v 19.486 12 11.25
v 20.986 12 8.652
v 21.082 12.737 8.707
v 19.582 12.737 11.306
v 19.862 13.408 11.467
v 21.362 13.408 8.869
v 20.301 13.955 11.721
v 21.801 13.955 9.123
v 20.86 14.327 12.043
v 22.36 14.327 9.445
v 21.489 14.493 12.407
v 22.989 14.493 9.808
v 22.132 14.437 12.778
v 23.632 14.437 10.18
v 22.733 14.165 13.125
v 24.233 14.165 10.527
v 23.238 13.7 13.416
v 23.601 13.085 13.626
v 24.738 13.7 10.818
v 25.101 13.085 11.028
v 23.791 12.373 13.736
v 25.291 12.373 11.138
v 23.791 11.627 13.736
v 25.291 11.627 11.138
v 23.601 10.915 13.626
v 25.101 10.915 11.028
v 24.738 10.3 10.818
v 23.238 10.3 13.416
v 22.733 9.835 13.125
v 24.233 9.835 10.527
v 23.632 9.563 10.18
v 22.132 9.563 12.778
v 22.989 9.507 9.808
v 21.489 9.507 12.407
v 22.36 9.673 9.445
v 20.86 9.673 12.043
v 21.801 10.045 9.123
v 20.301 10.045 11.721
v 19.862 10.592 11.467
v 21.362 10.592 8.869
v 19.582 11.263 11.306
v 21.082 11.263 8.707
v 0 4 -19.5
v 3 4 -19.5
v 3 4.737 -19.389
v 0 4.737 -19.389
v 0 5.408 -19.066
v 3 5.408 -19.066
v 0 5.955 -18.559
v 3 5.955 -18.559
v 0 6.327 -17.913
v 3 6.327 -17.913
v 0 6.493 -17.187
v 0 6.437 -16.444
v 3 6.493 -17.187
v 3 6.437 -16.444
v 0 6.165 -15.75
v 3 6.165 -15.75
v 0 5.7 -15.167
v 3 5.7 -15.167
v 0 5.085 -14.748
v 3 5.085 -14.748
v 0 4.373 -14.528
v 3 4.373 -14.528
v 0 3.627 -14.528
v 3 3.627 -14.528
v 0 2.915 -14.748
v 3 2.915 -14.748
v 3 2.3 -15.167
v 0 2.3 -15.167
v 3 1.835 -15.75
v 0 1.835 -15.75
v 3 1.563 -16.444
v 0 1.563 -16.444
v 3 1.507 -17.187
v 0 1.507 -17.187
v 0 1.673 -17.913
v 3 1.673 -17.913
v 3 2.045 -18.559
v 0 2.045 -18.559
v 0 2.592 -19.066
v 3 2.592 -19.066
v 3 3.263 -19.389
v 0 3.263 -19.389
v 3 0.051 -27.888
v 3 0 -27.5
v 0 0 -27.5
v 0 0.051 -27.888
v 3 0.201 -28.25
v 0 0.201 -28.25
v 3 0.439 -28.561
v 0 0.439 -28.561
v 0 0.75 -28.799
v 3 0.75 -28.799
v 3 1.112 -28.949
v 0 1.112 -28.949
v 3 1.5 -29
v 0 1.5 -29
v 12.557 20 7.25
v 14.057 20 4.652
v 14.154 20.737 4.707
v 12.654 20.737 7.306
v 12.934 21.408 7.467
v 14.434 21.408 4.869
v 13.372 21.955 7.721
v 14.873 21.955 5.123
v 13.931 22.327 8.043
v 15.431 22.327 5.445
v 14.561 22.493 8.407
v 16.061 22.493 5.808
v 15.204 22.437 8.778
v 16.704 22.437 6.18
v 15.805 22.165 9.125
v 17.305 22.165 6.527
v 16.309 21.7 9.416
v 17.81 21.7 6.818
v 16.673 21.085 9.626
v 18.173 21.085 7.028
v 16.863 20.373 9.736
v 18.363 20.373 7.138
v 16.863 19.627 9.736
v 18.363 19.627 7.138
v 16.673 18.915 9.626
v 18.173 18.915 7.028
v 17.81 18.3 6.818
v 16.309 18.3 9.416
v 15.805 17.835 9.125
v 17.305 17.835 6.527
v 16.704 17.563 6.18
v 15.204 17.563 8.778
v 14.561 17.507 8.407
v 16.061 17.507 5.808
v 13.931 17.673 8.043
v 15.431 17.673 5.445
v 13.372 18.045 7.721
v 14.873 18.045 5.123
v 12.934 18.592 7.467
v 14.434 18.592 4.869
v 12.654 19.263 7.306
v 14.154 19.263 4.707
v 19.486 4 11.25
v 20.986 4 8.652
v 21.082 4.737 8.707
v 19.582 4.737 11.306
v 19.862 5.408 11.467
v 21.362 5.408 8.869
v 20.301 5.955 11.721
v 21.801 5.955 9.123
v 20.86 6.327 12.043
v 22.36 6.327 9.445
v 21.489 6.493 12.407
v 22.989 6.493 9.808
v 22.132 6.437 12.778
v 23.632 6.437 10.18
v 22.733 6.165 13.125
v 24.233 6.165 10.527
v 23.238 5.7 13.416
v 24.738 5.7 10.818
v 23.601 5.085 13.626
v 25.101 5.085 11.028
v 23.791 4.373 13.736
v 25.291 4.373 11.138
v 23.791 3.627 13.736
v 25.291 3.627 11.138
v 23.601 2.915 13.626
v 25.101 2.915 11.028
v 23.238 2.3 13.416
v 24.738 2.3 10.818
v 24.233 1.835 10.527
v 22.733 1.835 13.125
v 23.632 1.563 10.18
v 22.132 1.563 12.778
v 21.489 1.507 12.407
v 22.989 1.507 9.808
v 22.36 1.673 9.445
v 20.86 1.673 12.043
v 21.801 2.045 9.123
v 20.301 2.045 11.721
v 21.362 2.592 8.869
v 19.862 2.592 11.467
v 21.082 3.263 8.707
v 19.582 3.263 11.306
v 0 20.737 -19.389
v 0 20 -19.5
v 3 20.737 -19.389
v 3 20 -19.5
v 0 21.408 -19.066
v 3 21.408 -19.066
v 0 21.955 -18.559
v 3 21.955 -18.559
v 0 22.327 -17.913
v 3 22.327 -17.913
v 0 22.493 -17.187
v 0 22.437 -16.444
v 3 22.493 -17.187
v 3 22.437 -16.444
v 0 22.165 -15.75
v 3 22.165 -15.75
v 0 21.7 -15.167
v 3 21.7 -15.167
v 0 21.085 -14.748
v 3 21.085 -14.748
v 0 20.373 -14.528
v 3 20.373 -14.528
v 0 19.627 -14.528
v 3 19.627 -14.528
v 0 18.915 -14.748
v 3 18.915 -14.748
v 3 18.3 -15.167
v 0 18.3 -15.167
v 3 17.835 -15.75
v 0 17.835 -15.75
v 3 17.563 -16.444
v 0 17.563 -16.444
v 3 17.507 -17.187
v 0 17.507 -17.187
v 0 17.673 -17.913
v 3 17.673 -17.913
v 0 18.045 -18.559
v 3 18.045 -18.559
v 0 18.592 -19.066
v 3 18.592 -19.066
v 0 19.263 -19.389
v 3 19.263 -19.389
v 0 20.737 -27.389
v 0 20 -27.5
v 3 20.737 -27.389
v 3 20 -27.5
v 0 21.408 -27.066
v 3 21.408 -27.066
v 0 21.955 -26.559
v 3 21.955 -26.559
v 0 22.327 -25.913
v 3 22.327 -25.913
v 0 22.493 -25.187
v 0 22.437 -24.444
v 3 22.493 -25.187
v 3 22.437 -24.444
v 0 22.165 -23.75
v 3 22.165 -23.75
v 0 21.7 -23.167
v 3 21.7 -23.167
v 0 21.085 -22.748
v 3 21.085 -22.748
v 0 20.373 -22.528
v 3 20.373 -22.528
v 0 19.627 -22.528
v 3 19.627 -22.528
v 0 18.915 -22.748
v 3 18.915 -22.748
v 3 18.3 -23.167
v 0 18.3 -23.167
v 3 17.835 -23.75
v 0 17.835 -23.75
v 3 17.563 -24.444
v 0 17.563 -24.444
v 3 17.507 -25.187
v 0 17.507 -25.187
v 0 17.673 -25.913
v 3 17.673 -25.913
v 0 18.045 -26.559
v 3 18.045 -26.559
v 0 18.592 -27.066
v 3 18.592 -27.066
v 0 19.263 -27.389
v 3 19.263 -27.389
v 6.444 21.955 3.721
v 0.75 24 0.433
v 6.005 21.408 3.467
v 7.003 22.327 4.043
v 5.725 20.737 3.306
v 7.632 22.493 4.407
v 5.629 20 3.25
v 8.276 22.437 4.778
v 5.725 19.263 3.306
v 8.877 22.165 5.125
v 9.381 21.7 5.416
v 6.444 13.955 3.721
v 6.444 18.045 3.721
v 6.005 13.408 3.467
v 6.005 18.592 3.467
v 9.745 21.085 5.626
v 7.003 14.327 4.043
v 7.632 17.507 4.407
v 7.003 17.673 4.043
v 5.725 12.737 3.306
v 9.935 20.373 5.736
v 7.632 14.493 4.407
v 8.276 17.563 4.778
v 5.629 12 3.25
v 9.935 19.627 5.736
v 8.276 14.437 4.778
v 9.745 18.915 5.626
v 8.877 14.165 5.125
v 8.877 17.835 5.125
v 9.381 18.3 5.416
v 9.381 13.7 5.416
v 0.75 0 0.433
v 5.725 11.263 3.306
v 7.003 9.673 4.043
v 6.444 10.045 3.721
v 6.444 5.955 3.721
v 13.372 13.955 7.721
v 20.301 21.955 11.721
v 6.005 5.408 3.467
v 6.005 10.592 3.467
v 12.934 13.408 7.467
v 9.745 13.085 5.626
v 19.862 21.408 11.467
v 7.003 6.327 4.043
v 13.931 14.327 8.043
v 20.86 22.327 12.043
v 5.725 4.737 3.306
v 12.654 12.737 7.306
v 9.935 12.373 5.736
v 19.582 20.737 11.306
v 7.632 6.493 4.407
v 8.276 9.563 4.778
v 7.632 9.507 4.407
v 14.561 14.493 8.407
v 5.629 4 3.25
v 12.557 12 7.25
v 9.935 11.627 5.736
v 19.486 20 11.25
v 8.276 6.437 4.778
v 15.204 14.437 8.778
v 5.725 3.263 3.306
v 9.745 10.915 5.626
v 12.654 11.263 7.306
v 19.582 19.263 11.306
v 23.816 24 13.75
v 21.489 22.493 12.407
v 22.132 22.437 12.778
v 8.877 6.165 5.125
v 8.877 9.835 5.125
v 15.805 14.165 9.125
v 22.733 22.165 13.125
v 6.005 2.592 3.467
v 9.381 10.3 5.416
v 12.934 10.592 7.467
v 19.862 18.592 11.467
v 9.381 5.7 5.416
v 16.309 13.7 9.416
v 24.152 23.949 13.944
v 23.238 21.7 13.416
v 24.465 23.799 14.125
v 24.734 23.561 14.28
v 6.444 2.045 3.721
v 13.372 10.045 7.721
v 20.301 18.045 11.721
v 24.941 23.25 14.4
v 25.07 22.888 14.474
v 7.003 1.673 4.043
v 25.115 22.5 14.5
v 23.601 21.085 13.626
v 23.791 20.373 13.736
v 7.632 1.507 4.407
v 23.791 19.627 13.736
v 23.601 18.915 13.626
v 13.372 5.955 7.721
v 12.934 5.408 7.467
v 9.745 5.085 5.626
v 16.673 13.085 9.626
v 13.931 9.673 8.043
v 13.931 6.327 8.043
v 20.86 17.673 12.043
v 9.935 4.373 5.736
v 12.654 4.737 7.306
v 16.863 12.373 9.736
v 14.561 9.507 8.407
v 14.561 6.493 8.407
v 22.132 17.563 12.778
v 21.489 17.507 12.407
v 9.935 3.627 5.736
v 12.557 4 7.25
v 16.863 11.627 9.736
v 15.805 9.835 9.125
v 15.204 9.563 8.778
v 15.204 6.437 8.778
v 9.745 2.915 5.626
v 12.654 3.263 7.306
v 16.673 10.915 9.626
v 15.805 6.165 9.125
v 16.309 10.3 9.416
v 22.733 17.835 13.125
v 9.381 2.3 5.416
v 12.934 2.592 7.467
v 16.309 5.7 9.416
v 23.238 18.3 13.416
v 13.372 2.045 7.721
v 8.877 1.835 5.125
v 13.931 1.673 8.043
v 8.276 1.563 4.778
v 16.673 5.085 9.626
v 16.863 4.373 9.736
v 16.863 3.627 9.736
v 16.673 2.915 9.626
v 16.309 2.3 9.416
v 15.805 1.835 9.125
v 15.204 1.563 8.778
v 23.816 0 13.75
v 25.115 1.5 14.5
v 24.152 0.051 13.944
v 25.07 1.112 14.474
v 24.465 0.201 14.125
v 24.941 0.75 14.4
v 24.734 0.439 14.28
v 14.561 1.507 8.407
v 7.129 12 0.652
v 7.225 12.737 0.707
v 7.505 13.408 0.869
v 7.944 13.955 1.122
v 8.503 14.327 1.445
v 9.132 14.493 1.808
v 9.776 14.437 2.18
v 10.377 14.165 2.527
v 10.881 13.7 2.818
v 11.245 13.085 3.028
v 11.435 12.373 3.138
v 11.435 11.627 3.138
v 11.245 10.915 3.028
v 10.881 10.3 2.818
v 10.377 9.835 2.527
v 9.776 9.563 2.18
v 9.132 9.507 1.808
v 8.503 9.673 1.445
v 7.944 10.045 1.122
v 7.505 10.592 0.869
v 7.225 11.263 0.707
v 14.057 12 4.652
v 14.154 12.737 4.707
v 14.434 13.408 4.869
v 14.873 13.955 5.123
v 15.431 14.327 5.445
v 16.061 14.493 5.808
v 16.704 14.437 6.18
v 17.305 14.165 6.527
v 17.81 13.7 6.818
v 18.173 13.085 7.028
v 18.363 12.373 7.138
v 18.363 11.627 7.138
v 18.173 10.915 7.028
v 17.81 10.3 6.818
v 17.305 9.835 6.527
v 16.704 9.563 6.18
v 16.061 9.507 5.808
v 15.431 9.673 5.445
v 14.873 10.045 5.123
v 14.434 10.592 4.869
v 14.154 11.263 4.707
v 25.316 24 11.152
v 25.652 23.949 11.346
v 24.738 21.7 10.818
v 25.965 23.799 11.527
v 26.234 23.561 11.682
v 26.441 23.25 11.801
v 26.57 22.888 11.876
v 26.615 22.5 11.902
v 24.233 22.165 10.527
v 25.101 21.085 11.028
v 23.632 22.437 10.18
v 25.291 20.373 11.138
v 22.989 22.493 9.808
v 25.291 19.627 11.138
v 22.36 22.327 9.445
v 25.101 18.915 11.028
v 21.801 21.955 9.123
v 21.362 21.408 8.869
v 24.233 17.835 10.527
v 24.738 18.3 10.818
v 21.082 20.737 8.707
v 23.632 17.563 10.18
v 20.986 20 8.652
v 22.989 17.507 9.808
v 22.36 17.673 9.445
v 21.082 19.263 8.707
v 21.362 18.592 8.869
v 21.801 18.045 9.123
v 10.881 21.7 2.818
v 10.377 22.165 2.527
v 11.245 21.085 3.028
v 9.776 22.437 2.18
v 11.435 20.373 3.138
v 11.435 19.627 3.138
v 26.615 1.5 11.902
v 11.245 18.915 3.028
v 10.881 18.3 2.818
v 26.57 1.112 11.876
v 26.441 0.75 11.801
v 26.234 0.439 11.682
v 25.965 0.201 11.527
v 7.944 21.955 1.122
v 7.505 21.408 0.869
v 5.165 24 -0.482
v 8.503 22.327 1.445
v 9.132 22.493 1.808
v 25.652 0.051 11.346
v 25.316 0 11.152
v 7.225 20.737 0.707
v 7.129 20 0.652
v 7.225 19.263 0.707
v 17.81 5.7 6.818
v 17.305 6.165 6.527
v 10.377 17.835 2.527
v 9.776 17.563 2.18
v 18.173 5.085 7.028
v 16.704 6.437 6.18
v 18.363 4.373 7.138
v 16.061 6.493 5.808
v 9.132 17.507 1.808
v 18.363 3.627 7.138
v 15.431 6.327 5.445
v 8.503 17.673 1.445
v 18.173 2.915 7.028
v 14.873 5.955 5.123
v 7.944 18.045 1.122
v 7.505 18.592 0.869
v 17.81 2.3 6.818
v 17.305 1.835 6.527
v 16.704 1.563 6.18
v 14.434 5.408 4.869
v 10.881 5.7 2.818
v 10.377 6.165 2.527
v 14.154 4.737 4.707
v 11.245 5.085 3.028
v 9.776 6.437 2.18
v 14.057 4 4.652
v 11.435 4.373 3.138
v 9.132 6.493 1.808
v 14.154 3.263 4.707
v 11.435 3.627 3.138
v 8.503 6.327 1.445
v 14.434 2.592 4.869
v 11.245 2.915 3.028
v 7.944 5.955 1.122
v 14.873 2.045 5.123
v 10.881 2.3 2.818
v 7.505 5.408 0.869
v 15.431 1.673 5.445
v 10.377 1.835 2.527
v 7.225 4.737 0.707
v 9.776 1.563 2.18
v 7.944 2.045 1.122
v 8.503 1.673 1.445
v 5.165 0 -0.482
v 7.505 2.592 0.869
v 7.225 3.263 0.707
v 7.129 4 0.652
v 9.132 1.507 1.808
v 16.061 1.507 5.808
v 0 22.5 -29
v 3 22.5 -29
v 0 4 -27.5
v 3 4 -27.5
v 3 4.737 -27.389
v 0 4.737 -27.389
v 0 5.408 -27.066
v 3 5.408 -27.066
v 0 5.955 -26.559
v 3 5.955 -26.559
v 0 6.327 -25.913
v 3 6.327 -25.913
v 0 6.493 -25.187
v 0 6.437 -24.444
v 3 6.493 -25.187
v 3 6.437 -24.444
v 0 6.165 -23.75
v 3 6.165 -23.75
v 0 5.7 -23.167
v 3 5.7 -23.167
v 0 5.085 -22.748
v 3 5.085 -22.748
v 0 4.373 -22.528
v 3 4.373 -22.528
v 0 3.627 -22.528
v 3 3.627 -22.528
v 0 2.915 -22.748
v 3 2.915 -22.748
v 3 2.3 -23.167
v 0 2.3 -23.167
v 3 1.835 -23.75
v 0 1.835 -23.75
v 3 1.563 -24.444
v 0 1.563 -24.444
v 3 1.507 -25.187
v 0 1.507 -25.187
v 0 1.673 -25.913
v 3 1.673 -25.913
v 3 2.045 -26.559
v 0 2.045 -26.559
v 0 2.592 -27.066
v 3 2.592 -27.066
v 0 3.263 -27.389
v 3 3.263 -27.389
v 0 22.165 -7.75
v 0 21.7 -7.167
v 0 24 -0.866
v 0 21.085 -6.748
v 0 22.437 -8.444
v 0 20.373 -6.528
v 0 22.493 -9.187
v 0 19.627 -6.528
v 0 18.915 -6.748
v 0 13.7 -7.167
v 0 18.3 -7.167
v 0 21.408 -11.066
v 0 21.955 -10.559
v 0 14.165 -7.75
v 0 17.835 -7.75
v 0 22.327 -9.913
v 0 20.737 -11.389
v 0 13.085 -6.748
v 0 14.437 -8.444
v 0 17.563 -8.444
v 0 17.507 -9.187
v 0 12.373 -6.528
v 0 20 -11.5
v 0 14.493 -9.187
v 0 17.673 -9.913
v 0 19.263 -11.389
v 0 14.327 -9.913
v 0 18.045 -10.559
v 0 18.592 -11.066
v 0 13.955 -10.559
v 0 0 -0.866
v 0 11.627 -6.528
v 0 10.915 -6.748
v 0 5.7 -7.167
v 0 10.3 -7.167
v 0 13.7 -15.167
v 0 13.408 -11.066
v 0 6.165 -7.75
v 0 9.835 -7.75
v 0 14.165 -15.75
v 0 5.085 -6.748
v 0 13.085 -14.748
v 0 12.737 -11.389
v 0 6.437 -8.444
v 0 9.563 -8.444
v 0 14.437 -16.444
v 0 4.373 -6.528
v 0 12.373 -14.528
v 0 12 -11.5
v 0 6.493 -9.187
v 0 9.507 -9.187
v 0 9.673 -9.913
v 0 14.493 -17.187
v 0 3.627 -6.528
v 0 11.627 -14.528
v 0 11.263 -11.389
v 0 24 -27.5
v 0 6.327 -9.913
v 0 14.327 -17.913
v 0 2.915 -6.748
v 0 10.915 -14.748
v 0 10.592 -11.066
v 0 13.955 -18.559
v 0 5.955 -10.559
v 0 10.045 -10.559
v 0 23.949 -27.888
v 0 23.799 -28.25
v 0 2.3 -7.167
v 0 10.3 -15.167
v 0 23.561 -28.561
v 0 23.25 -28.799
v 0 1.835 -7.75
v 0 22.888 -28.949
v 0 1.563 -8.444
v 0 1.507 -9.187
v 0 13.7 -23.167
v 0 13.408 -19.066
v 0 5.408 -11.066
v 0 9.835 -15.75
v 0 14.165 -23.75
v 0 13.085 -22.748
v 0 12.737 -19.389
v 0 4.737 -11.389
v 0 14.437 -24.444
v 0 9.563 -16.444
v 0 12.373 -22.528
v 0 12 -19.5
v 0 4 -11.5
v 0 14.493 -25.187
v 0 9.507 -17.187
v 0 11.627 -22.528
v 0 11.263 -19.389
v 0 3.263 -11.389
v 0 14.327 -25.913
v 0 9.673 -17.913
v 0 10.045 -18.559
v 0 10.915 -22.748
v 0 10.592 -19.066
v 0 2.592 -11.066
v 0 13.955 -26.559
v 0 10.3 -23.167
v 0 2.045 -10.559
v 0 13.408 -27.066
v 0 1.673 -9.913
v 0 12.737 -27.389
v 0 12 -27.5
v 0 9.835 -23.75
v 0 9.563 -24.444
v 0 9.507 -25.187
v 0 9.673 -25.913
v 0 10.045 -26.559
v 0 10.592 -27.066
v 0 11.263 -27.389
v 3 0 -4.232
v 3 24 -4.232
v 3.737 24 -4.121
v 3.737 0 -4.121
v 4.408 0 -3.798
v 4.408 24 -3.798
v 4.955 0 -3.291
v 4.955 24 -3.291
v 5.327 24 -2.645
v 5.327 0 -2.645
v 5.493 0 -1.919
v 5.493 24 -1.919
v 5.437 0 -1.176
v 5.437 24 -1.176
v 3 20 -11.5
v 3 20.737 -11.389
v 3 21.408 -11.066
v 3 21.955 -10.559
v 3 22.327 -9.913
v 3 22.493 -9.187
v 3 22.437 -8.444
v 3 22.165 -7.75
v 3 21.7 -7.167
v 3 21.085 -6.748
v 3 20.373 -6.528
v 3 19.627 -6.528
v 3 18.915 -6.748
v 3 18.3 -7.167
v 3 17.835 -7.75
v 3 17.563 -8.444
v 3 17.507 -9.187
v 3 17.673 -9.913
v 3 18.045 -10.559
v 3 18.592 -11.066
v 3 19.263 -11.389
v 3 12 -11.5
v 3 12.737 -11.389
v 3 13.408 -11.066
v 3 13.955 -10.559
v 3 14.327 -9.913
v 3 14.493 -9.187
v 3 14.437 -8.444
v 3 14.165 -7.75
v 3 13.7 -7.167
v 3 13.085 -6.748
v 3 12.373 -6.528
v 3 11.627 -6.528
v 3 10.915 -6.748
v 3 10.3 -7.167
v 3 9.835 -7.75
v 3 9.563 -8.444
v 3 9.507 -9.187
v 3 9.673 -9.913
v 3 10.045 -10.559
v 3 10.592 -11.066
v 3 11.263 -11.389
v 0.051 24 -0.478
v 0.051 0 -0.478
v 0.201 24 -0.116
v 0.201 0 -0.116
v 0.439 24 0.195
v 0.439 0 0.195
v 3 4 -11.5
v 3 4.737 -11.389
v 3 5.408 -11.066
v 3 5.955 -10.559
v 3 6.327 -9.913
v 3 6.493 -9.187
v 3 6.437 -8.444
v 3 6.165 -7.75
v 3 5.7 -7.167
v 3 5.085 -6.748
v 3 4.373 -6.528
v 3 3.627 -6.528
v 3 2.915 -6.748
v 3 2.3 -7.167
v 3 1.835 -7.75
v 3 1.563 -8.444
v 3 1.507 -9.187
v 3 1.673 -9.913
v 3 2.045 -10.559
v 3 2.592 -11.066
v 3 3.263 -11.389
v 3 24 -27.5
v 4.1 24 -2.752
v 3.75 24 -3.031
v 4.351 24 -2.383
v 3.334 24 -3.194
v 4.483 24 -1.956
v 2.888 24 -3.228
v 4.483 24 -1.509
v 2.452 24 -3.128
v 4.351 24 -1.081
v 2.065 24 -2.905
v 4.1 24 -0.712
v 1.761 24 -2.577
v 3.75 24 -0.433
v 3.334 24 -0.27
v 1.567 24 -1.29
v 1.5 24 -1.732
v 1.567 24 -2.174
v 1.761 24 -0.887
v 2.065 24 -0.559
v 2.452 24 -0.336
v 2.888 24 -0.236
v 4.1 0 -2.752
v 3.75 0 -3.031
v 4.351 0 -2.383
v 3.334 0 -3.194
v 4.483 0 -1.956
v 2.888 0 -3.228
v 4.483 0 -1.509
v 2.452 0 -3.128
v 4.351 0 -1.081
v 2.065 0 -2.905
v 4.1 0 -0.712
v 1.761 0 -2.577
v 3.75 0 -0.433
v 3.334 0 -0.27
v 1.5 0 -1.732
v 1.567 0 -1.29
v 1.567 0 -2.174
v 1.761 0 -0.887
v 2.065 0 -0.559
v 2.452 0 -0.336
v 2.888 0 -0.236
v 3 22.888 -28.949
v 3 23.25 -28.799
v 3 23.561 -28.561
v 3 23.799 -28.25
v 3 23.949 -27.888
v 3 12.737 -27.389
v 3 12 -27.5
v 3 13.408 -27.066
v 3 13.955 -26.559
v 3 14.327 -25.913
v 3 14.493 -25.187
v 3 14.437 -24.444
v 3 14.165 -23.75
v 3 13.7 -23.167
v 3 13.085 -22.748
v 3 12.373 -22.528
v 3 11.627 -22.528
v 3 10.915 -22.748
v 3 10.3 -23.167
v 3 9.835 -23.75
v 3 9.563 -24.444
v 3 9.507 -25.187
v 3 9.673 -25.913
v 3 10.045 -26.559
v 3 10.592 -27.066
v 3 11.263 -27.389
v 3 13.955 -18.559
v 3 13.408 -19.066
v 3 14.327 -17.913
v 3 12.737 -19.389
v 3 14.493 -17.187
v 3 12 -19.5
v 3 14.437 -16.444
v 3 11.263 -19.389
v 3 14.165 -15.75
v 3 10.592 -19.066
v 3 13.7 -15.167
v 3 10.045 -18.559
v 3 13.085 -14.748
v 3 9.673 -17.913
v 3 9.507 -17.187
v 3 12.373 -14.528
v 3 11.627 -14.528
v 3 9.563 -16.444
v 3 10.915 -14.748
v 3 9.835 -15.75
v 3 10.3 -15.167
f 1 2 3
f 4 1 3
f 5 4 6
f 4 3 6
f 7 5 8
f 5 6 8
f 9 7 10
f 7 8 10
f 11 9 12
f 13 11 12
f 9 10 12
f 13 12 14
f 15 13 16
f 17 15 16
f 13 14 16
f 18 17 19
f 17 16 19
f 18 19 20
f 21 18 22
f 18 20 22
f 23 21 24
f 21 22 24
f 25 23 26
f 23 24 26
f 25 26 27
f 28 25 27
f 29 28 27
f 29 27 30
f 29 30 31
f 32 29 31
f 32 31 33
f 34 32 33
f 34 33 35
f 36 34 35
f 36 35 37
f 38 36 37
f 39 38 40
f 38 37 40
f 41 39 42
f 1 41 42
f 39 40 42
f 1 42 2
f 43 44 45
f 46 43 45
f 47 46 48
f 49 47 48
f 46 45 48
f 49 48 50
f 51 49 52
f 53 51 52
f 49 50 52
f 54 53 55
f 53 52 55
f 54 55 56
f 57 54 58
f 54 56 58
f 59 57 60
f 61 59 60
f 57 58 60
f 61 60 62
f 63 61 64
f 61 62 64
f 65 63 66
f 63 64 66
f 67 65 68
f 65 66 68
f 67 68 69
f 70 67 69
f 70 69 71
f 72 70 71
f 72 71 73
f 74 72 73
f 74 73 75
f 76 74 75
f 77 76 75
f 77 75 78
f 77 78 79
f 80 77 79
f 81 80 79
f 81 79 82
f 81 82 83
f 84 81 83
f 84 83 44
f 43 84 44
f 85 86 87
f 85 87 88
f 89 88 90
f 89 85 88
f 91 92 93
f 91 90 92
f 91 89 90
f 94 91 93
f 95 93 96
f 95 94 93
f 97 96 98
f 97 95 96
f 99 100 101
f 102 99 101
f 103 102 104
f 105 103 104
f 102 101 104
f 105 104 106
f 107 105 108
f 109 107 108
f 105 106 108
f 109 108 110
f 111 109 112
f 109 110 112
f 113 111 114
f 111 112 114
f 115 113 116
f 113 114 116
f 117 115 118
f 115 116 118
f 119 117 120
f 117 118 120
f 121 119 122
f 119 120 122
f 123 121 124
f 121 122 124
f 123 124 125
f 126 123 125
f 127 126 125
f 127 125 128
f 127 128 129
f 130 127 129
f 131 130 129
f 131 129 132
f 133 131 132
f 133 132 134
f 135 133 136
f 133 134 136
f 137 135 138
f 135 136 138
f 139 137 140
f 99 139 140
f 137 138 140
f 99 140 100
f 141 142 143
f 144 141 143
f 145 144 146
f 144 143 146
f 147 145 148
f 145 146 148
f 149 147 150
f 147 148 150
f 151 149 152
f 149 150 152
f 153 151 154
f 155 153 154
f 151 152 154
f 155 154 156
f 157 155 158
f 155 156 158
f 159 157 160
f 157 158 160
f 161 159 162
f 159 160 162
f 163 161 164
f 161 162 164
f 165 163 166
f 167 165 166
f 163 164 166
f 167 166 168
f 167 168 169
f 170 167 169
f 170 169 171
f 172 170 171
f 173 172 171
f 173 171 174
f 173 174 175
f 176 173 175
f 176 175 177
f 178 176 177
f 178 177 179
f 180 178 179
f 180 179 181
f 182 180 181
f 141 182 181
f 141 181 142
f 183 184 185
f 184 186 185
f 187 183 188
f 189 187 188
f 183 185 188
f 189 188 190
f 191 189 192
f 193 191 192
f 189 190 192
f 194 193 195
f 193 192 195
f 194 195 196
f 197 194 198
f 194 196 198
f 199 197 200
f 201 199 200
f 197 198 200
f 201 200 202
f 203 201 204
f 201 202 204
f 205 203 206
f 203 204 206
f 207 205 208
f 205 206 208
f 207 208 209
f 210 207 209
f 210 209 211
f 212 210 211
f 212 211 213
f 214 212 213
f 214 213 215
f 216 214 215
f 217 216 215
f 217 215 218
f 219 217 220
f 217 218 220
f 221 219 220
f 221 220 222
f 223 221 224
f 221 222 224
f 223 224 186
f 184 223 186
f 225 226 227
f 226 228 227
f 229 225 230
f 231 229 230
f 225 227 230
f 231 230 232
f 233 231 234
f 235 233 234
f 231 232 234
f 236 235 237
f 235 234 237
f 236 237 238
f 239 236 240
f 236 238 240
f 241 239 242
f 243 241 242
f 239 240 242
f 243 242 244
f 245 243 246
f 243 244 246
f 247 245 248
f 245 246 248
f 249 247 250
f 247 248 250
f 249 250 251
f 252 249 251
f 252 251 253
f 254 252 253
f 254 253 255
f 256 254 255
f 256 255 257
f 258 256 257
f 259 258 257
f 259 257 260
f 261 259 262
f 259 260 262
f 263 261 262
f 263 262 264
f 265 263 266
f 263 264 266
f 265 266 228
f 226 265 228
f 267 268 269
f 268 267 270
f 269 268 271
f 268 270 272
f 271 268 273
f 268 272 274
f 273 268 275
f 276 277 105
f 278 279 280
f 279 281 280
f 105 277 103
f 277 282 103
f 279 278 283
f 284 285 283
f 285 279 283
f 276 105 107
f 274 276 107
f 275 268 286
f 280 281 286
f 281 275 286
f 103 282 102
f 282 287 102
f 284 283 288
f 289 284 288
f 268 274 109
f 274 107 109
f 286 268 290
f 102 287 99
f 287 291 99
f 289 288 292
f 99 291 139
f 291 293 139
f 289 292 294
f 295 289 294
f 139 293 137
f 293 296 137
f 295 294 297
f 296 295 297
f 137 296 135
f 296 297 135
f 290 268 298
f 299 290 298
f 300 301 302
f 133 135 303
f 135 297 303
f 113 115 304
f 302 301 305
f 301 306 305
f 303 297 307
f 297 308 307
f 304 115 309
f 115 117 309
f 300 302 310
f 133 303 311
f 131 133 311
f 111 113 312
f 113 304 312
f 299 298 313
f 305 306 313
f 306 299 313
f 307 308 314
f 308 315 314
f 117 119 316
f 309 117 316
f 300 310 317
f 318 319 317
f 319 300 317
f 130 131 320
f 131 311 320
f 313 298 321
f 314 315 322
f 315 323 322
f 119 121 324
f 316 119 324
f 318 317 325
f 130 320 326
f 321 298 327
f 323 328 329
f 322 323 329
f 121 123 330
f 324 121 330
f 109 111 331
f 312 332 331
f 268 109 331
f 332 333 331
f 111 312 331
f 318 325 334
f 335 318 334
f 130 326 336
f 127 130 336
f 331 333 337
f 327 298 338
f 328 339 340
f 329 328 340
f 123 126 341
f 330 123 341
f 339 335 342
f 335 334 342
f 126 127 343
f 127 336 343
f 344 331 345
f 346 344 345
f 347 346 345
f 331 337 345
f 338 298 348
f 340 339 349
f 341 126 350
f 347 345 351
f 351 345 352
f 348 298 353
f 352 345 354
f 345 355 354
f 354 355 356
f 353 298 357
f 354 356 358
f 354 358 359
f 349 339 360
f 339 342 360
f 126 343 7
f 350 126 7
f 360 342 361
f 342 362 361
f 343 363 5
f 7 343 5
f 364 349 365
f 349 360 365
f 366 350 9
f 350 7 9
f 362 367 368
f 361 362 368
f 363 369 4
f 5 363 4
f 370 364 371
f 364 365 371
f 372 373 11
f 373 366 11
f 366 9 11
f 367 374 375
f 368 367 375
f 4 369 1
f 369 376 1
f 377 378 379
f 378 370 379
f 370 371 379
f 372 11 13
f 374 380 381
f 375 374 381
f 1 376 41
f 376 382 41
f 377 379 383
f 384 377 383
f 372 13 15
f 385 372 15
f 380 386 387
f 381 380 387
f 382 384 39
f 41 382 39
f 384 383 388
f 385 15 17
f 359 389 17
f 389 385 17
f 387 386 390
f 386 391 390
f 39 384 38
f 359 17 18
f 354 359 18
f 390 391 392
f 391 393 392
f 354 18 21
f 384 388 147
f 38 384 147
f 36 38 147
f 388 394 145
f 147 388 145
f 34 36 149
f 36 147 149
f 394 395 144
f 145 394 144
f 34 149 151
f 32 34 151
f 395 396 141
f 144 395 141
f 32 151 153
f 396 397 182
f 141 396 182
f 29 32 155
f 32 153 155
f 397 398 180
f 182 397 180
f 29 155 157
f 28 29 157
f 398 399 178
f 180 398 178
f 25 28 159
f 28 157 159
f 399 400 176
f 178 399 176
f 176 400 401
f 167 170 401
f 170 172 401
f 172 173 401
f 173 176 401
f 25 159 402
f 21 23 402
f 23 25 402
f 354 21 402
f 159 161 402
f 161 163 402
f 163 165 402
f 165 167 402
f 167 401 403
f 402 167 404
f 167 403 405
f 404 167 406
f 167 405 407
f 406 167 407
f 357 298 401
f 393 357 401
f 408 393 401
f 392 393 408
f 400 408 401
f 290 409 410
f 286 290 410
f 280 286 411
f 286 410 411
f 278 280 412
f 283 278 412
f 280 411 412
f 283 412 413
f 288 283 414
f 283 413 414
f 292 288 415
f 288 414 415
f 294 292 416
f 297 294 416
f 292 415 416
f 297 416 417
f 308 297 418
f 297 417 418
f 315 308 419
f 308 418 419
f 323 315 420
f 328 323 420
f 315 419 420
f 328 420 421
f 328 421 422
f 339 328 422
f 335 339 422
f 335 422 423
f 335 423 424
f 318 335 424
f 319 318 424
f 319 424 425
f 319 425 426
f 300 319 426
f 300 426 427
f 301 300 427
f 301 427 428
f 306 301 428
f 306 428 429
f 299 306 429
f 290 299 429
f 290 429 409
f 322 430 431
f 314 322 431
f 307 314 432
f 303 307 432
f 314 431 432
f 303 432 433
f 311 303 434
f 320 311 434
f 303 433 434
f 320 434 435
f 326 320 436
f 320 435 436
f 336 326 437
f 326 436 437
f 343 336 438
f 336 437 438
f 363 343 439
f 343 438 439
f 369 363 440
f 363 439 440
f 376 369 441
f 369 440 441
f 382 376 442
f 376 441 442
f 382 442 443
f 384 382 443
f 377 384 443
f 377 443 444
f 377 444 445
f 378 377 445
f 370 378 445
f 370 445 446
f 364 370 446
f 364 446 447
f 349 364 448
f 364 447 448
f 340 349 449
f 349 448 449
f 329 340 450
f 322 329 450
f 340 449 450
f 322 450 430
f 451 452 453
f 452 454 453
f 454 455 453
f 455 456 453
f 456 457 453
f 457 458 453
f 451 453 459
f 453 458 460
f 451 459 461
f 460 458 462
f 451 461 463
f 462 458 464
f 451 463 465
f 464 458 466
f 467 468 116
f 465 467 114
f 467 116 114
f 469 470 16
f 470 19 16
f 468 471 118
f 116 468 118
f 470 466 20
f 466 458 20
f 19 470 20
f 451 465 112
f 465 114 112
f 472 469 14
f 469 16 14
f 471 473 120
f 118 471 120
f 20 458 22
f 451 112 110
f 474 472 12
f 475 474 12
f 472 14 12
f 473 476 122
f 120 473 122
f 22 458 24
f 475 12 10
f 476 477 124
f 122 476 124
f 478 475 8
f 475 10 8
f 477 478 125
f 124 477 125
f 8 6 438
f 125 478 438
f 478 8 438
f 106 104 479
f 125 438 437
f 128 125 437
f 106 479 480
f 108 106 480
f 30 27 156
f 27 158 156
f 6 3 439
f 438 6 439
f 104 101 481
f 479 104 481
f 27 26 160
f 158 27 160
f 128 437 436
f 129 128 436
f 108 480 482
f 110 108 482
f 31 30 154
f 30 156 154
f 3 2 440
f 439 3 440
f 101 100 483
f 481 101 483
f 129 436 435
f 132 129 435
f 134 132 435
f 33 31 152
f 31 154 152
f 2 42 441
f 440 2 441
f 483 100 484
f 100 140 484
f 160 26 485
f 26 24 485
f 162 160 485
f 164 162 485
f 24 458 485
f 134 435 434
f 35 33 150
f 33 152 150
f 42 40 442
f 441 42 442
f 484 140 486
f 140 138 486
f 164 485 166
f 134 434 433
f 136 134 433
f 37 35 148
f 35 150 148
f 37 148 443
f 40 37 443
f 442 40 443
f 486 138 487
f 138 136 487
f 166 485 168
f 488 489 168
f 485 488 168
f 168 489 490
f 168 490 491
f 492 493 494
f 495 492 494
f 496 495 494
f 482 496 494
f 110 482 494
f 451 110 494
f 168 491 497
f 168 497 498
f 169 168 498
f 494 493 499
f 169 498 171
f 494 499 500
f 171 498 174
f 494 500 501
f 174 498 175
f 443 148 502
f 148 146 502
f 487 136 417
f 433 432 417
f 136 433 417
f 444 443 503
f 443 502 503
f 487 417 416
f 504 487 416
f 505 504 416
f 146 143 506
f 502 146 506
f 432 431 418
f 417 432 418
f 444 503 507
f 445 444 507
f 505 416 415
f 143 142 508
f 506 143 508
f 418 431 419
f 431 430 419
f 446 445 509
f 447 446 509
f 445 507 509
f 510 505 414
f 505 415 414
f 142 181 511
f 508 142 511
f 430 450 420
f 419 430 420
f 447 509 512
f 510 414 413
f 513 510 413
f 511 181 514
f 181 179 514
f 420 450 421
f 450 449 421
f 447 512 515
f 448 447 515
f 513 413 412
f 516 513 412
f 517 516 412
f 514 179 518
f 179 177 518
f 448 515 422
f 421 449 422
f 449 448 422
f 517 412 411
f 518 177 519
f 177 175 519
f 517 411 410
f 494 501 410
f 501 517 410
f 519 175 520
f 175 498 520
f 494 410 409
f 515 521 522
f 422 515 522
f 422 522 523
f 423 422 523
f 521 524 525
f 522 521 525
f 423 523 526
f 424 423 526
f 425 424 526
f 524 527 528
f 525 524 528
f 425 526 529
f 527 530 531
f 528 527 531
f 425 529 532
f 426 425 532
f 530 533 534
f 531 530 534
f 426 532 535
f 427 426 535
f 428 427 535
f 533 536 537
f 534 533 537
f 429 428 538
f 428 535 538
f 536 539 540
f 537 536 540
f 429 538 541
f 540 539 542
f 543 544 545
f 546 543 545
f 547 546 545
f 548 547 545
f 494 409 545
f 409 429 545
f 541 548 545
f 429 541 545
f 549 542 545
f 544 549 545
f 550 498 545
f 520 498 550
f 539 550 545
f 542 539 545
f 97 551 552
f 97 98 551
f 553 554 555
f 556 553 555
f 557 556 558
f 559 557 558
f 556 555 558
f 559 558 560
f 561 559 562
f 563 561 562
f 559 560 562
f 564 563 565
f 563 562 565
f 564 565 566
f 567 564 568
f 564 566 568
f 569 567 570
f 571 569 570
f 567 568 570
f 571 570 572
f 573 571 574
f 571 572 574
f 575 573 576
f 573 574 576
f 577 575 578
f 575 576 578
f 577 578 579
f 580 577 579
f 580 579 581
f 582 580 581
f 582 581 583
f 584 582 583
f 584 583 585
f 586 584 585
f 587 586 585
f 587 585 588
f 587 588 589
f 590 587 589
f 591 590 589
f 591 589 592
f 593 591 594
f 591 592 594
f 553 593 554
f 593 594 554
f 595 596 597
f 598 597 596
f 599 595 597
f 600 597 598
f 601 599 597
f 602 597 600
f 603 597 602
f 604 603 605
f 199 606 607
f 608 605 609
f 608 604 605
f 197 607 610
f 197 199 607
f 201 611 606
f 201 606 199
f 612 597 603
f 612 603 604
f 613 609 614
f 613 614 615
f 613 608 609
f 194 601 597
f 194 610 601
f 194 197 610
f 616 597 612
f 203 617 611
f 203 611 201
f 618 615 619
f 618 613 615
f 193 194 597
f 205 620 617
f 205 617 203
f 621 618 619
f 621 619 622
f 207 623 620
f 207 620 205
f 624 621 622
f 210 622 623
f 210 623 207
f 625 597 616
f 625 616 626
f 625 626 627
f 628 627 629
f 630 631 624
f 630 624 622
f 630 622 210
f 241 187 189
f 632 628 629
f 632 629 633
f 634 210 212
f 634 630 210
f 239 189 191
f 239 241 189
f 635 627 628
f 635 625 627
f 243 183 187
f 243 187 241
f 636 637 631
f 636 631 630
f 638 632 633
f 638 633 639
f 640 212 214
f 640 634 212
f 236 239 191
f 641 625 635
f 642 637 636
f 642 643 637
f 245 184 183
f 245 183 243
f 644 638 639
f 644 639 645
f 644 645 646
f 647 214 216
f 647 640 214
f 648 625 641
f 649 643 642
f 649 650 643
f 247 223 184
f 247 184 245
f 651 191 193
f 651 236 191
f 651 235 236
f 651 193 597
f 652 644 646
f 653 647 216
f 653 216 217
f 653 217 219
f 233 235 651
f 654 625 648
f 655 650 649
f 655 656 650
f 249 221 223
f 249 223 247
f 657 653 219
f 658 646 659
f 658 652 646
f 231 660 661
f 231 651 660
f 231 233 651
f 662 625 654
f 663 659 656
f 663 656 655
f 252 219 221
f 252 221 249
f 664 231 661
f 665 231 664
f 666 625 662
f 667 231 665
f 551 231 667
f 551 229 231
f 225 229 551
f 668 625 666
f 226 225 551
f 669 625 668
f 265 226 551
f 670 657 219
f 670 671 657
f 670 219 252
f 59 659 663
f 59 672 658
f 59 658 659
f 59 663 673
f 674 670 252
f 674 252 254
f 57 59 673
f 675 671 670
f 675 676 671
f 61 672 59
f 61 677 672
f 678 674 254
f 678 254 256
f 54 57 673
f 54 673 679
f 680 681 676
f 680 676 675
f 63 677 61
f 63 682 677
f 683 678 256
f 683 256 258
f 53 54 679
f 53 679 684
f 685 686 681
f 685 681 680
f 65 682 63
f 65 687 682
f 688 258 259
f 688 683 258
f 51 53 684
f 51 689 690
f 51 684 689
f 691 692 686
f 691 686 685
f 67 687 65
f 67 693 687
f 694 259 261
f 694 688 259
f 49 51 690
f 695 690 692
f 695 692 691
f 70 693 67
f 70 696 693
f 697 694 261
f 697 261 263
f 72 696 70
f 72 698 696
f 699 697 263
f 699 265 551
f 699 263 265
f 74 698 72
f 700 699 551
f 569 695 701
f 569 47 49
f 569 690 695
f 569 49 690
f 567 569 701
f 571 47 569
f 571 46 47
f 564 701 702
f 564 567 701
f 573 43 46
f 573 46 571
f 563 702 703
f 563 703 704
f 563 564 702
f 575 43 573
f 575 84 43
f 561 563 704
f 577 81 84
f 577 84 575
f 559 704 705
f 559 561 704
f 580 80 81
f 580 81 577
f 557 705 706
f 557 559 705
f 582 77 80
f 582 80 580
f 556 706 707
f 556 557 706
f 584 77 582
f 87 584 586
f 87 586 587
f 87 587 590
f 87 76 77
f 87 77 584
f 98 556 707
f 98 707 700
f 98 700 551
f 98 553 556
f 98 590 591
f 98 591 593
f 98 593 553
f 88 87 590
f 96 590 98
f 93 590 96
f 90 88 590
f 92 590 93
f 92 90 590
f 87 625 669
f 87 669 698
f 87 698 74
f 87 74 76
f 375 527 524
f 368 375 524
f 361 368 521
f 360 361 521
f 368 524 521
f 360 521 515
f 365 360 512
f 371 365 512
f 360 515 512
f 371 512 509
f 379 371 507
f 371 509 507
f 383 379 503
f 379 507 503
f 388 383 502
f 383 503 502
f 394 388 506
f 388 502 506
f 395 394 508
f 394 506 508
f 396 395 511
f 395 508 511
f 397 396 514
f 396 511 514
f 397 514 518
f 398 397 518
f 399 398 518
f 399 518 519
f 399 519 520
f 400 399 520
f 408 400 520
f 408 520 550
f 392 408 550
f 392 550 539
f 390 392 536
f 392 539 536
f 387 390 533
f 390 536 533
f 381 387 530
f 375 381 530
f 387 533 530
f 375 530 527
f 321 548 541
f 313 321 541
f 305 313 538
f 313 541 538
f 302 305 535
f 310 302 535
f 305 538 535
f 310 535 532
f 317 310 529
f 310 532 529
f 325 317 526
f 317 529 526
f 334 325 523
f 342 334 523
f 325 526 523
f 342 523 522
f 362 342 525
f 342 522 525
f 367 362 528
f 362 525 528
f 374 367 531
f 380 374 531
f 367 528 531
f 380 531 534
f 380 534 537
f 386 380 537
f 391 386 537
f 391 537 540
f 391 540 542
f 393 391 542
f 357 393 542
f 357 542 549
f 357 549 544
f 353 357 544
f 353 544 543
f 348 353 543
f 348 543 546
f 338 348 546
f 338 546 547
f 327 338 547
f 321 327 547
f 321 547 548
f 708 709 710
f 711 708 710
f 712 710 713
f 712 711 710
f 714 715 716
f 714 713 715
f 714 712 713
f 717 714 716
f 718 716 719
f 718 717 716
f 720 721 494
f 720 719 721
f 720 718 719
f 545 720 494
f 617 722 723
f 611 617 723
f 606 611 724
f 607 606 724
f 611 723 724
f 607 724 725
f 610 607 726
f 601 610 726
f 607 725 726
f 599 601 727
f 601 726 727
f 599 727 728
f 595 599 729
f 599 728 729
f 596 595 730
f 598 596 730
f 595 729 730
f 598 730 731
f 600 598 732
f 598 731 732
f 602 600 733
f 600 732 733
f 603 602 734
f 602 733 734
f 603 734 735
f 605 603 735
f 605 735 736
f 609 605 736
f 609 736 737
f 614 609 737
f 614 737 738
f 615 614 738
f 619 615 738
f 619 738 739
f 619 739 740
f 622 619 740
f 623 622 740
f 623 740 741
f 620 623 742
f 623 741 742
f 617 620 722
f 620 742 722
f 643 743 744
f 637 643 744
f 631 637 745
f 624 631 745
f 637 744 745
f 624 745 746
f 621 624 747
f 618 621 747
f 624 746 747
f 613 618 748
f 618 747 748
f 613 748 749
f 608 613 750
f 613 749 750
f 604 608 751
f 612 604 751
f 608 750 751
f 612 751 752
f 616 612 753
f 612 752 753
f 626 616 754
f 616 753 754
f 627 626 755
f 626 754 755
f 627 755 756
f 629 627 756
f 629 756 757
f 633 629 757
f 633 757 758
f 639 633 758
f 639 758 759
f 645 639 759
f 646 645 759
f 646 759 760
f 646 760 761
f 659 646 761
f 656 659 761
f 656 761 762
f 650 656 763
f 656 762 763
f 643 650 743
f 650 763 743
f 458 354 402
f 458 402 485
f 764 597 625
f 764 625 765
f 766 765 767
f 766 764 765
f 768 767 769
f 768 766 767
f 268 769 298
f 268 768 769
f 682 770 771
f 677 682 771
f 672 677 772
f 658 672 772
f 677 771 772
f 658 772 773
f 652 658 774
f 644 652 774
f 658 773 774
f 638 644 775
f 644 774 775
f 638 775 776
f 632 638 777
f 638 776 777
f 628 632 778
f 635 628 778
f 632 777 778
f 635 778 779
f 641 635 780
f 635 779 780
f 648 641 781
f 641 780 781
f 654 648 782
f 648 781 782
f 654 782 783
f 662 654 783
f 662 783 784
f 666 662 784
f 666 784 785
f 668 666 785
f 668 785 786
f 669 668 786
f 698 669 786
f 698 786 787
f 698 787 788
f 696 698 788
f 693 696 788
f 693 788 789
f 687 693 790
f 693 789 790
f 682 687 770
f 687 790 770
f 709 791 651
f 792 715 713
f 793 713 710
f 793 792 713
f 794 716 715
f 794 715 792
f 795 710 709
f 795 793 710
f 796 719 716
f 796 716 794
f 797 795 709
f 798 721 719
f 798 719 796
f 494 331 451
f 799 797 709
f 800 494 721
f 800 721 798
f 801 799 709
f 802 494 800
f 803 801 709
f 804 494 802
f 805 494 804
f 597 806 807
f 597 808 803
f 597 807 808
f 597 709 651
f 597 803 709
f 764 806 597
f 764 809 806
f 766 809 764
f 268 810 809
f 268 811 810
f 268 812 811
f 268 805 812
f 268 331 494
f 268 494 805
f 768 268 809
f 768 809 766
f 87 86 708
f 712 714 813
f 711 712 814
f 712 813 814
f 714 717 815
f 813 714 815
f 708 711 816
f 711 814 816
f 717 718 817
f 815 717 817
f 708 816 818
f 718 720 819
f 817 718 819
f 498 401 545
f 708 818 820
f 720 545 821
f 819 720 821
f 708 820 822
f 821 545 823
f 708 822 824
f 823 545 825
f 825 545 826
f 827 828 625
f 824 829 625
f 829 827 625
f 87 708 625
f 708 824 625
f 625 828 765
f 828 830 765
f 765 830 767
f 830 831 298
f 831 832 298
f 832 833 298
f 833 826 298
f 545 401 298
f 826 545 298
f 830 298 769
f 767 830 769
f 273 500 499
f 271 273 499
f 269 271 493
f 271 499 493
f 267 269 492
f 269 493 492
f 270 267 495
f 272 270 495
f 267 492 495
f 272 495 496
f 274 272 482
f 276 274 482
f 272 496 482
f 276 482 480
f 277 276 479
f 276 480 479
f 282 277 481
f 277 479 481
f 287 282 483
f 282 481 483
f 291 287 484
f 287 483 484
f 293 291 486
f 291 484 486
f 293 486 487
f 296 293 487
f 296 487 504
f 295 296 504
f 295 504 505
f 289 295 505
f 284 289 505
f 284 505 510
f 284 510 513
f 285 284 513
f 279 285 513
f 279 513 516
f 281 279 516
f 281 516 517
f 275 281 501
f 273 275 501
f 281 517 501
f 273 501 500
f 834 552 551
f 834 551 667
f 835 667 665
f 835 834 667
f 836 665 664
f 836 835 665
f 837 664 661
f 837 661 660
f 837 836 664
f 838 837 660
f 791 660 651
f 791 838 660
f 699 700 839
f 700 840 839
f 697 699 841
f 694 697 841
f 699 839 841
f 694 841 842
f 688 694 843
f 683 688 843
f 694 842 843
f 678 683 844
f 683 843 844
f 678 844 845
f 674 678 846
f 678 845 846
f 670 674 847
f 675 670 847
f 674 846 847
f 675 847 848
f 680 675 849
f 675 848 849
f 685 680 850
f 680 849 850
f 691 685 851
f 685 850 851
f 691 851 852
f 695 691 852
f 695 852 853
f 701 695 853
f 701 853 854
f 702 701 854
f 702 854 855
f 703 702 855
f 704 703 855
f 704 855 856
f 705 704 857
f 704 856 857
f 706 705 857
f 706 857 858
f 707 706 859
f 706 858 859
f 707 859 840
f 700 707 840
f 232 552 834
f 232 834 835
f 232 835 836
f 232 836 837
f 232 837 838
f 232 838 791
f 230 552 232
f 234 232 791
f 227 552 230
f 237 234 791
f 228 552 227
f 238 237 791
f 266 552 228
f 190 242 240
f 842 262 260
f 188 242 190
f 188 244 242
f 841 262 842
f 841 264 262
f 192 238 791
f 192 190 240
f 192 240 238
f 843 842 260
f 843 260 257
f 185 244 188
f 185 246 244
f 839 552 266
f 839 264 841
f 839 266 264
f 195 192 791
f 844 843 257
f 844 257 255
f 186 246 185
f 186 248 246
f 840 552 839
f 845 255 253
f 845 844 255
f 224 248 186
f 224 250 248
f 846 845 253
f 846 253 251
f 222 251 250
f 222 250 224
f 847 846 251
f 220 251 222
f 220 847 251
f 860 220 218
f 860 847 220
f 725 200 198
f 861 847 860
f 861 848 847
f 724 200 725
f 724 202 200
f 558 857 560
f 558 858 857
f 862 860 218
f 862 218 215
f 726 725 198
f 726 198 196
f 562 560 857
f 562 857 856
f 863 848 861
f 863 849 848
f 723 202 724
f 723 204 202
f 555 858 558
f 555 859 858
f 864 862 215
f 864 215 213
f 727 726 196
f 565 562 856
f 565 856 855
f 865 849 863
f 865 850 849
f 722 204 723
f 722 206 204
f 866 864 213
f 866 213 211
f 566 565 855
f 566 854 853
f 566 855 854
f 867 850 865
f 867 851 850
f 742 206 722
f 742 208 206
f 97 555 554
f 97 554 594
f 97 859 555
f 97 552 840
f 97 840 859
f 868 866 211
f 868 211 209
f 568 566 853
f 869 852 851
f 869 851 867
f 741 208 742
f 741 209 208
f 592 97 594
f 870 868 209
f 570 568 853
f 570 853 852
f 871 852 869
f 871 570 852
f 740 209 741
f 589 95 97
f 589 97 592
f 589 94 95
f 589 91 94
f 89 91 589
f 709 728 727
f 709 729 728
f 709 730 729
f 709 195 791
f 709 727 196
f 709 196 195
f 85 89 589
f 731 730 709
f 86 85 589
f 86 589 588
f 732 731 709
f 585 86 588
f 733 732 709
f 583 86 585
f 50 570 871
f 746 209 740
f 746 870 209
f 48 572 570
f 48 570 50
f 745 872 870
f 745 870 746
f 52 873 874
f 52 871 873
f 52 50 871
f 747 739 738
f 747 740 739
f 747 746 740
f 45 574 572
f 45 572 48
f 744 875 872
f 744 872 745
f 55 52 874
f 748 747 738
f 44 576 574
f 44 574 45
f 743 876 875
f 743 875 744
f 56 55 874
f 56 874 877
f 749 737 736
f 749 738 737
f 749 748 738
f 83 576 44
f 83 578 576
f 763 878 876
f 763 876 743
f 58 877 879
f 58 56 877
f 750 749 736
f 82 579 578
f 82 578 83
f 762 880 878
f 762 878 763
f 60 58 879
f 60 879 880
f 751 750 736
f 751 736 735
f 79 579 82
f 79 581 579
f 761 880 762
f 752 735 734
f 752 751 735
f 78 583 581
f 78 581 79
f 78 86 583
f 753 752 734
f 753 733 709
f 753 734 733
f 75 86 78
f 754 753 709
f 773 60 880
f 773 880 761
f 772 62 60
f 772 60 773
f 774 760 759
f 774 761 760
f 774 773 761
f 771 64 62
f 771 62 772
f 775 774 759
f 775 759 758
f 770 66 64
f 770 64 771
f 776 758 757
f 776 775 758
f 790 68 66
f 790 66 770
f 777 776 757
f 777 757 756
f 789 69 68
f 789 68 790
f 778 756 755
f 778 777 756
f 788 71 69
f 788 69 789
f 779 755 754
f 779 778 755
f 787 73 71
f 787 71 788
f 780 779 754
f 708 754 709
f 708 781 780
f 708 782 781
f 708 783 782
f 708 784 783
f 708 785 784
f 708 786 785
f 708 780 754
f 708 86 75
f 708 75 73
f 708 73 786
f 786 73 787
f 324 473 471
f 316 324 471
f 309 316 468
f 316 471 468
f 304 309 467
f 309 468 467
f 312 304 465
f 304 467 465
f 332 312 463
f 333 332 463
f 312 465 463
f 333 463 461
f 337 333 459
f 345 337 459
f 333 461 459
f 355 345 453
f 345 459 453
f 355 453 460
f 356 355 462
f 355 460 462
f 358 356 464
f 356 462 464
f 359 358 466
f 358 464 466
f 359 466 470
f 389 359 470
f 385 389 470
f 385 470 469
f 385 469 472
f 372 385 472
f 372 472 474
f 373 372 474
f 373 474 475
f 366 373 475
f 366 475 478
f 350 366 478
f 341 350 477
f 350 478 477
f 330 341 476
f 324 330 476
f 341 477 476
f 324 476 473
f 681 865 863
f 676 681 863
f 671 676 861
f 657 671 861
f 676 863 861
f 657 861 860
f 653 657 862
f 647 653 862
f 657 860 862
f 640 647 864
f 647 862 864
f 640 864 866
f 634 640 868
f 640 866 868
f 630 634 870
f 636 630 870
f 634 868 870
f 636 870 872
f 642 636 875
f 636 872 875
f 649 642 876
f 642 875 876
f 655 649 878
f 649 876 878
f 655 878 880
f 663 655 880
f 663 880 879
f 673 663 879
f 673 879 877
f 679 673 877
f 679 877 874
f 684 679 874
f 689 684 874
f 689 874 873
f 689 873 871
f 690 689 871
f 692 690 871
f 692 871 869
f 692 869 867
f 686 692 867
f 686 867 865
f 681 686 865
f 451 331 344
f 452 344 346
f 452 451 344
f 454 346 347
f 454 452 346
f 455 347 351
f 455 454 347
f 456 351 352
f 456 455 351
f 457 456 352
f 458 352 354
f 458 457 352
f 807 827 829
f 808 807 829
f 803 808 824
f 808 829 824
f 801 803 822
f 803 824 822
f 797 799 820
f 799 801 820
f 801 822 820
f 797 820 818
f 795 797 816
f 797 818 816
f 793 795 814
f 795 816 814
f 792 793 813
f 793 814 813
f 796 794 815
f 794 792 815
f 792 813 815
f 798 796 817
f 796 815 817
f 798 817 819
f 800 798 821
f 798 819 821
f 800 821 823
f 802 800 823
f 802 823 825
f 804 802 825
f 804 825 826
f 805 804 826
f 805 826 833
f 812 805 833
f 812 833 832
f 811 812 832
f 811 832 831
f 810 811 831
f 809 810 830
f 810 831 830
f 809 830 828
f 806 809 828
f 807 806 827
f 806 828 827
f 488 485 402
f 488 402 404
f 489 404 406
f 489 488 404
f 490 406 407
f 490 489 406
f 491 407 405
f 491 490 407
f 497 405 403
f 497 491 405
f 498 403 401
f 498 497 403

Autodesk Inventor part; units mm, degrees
ref_plane "YZ Plane" through (0, 0, 0) normal (1, 0, 0) x (0, 1, 0)
ref_plane "XZ Plane" through (0, 0, 0) normal (0, 1, 0) x (-1, 0, 0)
ref_plane "XY Plane" through (0, 0, 0) normal (0, 0, 1) x (1, 0, 0)
sketch "Sketch1" plane through (0, 0, 0) normal (0, 1, 0) x (-1, 0, 0)
  line L0 (0, 0) -> (0, -29)
  line L1 (0, 0) -> (-25.1147, 14.5)
  line L2 (0, 0) -> (29, 0) construction
  line L3 (0, -29) -> (-3, -29)
  line L4 (-3, -29) -> (-3, -4.2321)
  line L5 (-25.1147, 14.5) -> (-26.6147, 11.9019)
  line L6 (-26.6147, 11.9019) -> (-5.1651, -0.4821)
  arc A0 (-5.1651, -0.4821) -> (-3, -4.2321) centre (-3, -1.7321) ccw
  circle A1 centre (-3, -1.7321) radius 1.5
extrude "Extrusion1" add sketch "Sketch1" along normal blind 24
fillet "Fillet1" radius 1.5 1 edges at (1.5, 24, -29)
fillet "Fillet2" radius 1.5 3 edges at (25.8647, 24, 13.201) (25.8647, 0, 13.201) (1.5, 0, -29)
sketch "Sketch2" plane through (3, 0, -4.2321) normal (1, 0, 0) x (0, 0, -1)
  line L0 (0, 0) -> (23.2679, 0) projected
  circle A0 centre (20.768, 20) radius 2.5
  circle A1 centre (20.7679, 12) radius 2.5
  circle A2 centre (20.7679, 4) radius 2.5
  line L1 (24.7679, 1.5) -> (24.7679, 22.5) projected
  circle A3 centre (4.768, 20) radius 2.5
  circle A4 centre (12.768, 20) radius 2.5
  circle A5 centre (12.768, 12) radius 2.5
  circle A6 centre (12.768, 4) radius 2.5
  circle A7 centre (4.768, 4) radius 2.5
  circle A8 centre (4.768, 12) radius 2.5
  point P0 (-4.2321, 0)
sketch "Sketch3" plane through (5.1651, 0, -0.4821) normal (0.5, 0, -0.866) x (-0.866, 0, -0.5)
  circle A0 centre (-20.7679, 20) radius 2.5
  circle A1 centre (-20.7679, 12) radius 2.5
  circle A2 centre (-20.7679, 4) radius 2.5
  circle A3 centre (-12.7679, 4) radius 2.5
  circle A4 centre (-12.7679, 12) radius 2.5
  circle A5 centre (-12.7679, 20) radius 2.5
  circle A6 centre (-4.7679, 20) radius 2.5
  circle A7 centre (-4.7679, 12) radius 2.5
  circle A8 centre (-4.7679, 4) radius 2.5
  point P0 (4.2321, 0)
extrude "Extrusion2" cut sketch "Sketch3" against normal blind 24 contours A2
extrude "Extrusion3" cut sketch "Sketch3" against normal blind 24 contours A0 | A1 | A3 | A4 | A5 | A6 | A7 | A8
extrude "Extrusion4" cut sketch "Sketch2" against normal blind 24
fillet "Fillet3" radius 1.5 1 edges at (0, 12, 0)
properties part number "Bracket Bend 3x3"
